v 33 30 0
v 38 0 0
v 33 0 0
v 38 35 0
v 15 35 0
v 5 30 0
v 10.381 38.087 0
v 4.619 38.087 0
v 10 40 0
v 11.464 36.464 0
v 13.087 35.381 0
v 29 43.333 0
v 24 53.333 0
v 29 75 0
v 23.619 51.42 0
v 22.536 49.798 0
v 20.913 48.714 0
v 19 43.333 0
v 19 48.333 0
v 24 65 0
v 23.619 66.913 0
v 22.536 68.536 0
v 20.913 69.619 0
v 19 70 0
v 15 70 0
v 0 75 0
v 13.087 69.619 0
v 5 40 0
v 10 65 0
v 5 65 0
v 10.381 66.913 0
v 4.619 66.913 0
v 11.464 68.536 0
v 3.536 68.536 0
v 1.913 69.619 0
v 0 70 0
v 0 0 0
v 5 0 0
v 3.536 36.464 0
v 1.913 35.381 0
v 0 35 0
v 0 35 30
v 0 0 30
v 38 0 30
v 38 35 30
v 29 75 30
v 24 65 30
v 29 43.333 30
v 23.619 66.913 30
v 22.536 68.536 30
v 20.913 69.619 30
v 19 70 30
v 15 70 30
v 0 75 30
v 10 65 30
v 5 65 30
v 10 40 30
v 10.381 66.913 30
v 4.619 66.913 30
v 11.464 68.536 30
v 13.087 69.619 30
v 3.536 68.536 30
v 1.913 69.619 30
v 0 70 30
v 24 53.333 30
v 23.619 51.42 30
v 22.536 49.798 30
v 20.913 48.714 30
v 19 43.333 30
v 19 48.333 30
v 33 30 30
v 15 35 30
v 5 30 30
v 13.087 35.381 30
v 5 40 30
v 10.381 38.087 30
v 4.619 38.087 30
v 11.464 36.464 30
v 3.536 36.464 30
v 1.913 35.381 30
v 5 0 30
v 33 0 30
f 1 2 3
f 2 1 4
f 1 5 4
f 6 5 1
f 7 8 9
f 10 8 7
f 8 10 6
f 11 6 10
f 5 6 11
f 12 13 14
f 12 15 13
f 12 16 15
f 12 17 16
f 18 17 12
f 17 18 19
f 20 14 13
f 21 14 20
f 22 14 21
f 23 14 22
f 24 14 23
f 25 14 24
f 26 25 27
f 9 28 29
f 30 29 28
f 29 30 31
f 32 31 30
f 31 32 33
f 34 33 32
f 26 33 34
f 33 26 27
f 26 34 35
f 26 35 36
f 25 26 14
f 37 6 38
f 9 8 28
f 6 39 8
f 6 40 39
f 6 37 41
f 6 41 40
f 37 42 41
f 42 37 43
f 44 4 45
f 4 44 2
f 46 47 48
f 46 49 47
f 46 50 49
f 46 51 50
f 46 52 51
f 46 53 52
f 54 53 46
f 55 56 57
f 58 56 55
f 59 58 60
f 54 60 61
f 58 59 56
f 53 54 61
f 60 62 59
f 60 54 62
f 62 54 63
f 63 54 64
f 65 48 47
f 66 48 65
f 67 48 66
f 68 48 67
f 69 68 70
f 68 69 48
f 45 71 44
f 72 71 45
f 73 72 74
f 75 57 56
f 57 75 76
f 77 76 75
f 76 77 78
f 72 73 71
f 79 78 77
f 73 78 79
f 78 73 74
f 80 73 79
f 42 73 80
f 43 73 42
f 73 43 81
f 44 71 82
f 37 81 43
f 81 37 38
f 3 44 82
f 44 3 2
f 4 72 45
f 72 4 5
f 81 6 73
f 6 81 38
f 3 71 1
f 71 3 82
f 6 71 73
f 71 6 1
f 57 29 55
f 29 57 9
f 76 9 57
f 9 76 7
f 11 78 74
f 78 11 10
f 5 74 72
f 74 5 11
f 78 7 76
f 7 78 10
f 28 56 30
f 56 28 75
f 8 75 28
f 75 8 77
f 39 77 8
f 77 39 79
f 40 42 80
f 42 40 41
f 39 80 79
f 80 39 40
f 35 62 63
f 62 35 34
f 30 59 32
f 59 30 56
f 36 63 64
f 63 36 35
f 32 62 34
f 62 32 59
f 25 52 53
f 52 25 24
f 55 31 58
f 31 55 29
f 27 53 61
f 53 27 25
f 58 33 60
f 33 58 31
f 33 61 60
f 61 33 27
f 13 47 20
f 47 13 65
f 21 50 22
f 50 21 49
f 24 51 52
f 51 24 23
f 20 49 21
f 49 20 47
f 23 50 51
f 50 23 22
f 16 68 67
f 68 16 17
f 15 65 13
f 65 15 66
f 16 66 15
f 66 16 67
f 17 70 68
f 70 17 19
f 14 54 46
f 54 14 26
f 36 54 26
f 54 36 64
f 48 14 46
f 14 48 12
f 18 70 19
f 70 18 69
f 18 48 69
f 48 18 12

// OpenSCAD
/* [Slider] */
length = 30; // [20:50]
/* [Hidden] */
margin = 5;
/* [Slider] */
desk = 28; // [10:50]
/*[ Slider ]*/
headphone = 40; // [30:60]

module rounded(t1, t2) {
    difference() {
        translate(t1) {
            cube([length, margin, margin]);
        }
        translate(t2) {
            rotate([0, 90, 0]) {
                cylinder(length, margin, margin);
            }
        }
    }  
}

module holder() {
    difference(){
        //desk holder
        translate([0, -margin, -margin])
        cube([length, length+margin, desk+margin*2]);
        
        //desk representation
        translate([-length/2, 0, 0])
        cube([length*2, length*2, desk]);
    }

    translate([0, -(headphone+margin), desk-margin]) {
        
        cube([length, headphone, margin]);
        
        translate([0, 0, margin])
        cube([length,margin, margin]);
        
        translate([0, 0, -desk/2])
        cube([length, margin, desk/2]);
        
        translate([0, 0, -desk/2-margin])
        cube([length, headphone *3/4, margin]);
        
        translate([0, headphone*2/3, -desk/2-margin])
        cube([length, margin, margin*2]);
        
        rounded([0, headphone-margin, -margin], [0, headphone-margin, -margin]);
        rounded([0, headphone-margin, margin], [0, headphone-margin, margin*2]);
        rounded([0, margin, margin], [0, margin*2, margin*2]);
        rounded([0, margin, -margin], [0, margin*2, -margin]);
        rounded([0, margin, -desk/2], [0, margin*2, margin-desk/2]);
        rounded([0, headphone*2/3-margin, -desk/2], [0, headphone*2/3-margin, margin-desk/2]);
    }
}

translate([margin+desk, length, length])
rotate([180, 90, 0])
holder();
